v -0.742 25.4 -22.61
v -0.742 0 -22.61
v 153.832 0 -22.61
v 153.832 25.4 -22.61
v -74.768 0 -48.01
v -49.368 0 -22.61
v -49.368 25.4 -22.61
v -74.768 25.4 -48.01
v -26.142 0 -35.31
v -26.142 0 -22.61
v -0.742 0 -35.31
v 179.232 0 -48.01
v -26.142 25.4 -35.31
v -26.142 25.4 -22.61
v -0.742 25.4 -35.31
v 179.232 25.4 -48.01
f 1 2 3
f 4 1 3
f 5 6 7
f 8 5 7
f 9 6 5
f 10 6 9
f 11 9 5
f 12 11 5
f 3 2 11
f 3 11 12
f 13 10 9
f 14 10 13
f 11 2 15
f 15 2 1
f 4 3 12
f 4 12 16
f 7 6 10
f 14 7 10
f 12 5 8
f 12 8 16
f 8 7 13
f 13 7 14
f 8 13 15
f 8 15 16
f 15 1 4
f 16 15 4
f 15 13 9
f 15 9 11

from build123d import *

# Parameters (mm, degrees)
F0_W     = 254
F0_H     = 25.4
F1_DEPTH = 25.4
F2_SIZE2 = 25.39999
F2_SIZE  = 25.39999
F3_SIZE2 = 25.39999
F3_SIZE  = 25.39999
F4_W     = 25.4
F4_H     = 25.4
F5_DEPTH = 12.7


# Not quite as in the source:
# - a fillet or chamfer is up to 0.001 mm smaller than in the source, because OpenCascade refuses the exact size


with BuildPart() as f1:
    # F0 (on Front) → F1 (new body)
    with BuildSketch(Plane.XZ):
        with Locations((52.2324490321, -35.310111469)):
            Rectangle(F0_W, F0_H)
    extrude(amount=-F1_DEPTH)

    # F2 (size 25.4 and 25.4 in the source; OpenCascade refuses exactly that, so slightly less here)
    f2_edges = [f1.edges().sort_by_distance(p)[0] for p in [
        (179.232449, 12.7, -22.610111),
    ]]
    chamfer(f2_edges, length=F2_SIZE, length2=F2_SIZE2)

    # F3 (size 25.4 and 25.4 in the source; OpenCascade refuses exactly that, so slightly less here)
    f3_edges = [f1.edges().sort_by_distance(p)[0] for p in [
        (-74.767551, 12.7, -22.610111),
    ]]
    chamfer(f3_edges, length=F3_SIZE, length2=F3_SIZE2)

    # F4 (on face) → F5 (cut)
    with BuildSketch(Plane.XY.offset(-22.610111469)):
        with Locations((-13.4418782175, 12.7)):
            Rectangle(F4_W, F4_H)
    extrude(amount=-F5_DEPTH, mode=Mode.SUBTRACT)


solid = f1.part
